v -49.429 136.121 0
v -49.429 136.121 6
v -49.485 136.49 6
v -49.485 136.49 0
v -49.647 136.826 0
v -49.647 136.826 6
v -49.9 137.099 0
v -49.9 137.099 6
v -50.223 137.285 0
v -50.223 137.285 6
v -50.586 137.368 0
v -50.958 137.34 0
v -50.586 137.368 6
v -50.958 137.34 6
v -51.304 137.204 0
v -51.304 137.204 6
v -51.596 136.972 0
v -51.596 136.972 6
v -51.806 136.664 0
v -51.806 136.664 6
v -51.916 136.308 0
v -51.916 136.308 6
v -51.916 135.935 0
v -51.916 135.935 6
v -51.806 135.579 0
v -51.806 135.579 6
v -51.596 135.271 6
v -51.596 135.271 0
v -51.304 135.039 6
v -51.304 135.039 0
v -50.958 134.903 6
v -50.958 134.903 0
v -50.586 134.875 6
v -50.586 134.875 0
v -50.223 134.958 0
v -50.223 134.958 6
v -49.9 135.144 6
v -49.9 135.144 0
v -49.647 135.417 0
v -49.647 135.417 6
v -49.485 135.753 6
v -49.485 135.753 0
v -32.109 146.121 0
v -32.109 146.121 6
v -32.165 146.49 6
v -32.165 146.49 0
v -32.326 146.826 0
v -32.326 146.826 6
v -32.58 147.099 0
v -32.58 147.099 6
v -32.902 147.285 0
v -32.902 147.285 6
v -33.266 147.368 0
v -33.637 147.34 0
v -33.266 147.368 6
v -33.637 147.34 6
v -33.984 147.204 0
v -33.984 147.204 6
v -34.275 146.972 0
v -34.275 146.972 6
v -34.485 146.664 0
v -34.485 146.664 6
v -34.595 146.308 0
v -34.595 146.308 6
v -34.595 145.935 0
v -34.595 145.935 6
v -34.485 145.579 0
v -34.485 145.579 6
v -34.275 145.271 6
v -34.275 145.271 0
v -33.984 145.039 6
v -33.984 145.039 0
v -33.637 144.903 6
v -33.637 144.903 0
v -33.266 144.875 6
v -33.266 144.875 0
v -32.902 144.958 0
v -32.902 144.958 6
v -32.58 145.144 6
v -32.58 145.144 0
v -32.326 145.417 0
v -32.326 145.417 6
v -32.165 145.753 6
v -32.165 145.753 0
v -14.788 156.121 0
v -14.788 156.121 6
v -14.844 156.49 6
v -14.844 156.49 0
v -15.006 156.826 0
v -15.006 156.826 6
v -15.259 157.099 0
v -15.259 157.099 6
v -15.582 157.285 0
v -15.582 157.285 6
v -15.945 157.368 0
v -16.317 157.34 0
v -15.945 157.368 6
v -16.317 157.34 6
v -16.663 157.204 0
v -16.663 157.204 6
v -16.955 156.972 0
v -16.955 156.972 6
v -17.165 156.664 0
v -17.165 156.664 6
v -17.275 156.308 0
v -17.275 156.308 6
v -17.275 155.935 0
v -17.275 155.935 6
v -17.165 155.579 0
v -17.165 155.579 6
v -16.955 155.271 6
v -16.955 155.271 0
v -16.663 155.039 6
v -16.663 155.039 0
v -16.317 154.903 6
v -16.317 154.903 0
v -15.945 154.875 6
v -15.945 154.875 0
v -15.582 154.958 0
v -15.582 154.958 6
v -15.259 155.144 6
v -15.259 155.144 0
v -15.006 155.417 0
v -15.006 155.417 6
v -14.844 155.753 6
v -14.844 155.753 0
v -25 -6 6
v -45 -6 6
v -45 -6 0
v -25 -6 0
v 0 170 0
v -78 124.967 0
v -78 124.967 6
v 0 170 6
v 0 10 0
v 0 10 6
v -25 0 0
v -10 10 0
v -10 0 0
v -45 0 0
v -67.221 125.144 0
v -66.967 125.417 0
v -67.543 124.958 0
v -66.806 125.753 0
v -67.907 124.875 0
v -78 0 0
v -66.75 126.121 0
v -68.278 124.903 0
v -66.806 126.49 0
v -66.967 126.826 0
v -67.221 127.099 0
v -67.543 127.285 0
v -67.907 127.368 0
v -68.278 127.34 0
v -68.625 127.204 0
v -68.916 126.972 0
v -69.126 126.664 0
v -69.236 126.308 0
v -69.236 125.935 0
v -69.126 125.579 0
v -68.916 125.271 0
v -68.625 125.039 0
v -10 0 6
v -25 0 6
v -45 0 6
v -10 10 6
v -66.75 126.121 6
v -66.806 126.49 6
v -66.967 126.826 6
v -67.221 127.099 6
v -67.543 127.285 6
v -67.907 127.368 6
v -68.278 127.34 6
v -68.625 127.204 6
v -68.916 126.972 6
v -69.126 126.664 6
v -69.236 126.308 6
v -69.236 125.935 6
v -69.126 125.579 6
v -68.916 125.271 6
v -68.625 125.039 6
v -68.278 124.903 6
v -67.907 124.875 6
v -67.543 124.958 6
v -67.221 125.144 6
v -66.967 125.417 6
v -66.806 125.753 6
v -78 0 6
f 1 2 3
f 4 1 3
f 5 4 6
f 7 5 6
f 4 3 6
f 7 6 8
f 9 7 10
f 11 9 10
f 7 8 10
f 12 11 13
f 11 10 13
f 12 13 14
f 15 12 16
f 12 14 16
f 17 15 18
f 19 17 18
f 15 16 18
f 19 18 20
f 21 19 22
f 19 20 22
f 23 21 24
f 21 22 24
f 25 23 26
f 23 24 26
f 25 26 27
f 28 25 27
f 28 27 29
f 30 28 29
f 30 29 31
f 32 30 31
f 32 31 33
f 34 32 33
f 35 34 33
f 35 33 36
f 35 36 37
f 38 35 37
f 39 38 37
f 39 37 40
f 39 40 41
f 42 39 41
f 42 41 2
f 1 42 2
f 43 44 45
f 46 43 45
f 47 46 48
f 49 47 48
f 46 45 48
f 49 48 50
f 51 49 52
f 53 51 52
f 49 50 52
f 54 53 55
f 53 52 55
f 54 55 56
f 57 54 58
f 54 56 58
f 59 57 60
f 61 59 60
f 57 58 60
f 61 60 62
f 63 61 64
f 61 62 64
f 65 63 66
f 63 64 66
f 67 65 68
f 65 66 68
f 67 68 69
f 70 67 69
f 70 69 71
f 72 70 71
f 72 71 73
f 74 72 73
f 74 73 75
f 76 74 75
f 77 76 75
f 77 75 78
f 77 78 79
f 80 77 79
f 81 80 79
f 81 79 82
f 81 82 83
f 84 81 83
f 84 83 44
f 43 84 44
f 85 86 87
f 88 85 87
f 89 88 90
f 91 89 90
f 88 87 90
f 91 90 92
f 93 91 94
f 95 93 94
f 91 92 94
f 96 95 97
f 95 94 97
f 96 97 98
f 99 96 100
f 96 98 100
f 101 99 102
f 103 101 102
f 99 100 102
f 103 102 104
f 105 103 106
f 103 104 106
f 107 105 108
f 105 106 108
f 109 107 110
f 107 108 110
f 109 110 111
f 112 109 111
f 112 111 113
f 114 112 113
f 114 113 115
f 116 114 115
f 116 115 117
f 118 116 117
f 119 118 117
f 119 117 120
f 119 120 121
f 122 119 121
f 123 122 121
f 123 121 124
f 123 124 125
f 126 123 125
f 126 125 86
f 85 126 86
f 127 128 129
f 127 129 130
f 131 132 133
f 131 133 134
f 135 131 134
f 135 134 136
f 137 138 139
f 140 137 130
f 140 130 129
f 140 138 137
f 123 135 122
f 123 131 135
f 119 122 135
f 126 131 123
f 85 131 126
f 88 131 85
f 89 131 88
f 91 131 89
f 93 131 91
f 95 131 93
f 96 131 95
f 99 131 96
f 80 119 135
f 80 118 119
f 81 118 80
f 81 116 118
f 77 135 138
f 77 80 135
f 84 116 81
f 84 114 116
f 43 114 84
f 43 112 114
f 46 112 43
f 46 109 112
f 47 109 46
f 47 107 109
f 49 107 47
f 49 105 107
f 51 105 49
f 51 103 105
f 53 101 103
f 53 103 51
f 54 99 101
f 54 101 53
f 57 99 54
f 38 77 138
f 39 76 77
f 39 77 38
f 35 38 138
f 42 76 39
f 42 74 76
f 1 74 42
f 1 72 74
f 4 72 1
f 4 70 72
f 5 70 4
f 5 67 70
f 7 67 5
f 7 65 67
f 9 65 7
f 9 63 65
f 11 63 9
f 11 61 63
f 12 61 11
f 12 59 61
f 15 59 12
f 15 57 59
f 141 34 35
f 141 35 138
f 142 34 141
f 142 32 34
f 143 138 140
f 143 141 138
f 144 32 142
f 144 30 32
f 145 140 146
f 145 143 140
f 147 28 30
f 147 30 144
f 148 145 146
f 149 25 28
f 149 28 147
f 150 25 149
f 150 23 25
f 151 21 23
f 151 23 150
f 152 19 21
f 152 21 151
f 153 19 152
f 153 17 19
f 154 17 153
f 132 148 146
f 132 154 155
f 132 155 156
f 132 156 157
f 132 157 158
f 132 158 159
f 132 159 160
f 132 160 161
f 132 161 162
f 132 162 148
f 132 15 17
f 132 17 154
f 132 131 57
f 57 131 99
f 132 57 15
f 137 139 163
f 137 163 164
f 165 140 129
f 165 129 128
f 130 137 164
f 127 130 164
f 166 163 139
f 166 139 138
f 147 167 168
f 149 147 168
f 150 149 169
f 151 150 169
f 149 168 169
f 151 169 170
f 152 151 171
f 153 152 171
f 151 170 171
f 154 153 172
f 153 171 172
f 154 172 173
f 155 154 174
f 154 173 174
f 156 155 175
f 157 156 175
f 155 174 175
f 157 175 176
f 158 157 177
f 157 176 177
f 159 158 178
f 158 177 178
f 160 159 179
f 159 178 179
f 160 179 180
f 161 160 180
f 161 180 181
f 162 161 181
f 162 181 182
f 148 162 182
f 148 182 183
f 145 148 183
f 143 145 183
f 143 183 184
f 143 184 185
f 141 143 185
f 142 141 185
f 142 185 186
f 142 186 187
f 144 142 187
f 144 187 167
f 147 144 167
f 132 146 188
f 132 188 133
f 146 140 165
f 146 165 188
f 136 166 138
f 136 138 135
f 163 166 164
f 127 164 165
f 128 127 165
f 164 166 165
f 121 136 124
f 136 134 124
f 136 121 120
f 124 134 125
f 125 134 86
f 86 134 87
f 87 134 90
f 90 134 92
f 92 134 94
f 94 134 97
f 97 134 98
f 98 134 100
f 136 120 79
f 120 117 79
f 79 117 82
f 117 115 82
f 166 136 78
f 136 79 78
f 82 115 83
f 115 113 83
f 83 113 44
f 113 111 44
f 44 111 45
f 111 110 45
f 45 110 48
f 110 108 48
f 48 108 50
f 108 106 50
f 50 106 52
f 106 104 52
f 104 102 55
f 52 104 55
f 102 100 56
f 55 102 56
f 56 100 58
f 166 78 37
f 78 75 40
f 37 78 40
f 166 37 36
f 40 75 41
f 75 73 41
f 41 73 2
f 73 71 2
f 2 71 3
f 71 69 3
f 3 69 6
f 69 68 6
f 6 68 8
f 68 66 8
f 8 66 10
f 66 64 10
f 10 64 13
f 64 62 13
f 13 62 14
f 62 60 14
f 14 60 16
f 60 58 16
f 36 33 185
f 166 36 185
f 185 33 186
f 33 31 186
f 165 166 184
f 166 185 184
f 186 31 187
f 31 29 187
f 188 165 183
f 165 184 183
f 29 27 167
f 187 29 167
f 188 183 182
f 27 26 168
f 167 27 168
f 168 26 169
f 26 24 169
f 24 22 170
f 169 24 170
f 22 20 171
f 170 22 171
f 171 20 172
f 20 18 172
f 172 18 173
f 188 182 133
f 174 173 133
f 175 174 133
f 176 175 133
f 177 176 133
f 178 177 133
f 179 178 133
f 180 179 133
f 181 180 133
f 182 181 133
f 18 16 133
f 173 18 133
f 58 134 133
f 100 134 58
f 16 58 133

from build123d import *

# Parameters (mm, degrees)
BOSS_EXTRU_1_DEPTH      = 6
ESQUISSE2_R             = 1.25
ESQUISSE2_W             = 10
ESQUISSE2_H             = 10
ENL_V_MAT_EXTRU_1_DEPTH = 10
ESQUISSE4_W             = 20
ESQUISSE4_H             = 6
BOSS_EXTRU_2_DEPTH      = 6


with BuildPart() as part:
    # Esquisse1 → Boss.-Extru.1 (new body)
    with BuildSketch(Plane.XY):
        Polygon((-78, 0), (-78, 124.966679003), (0, 170), (0, 0), align=None)
    extrude(amount=BOSS_EXTRU_1_DEPTH)

    # Esquisse2 → Enlèv. mat.-Extru.1 (cut)
    with BuildSketch(Plane.XY.offset(6)):
        with Locations((-68, 126.121379542)):
            Circle(ESQUISSE2_R)
        with Locations((-50.679491924, 136.121379542)):
            Circle(ESQUISSE2_R)
        with Locations((-16.038475773, 156.121379542)):
            Circle(ESQUISSE2_R)
        with Locations((-33.358983849, 146.121379542)):
            Circle(ESQUISSE2_R)
        with Locations((-5, 5)):
            Rectangle(ESQUISSE2_W, ESQUISSE2_H)
    extrude(amount=-ENL_V_MAT_EXTRU_1_DEPTH, mode=Mode.SUBTRACT)

    # Esquisse4 → Boss.-Extru.2 (add)
    with BuildSketch(Plane.XZ):
        with Locations((-35, 3)):
            Rectangle(ESQUISSE4_W, ESQUISSE4_H)
    extrude(amount=BOSS_EXTRU_2_DEPTH)


solid = part.part
